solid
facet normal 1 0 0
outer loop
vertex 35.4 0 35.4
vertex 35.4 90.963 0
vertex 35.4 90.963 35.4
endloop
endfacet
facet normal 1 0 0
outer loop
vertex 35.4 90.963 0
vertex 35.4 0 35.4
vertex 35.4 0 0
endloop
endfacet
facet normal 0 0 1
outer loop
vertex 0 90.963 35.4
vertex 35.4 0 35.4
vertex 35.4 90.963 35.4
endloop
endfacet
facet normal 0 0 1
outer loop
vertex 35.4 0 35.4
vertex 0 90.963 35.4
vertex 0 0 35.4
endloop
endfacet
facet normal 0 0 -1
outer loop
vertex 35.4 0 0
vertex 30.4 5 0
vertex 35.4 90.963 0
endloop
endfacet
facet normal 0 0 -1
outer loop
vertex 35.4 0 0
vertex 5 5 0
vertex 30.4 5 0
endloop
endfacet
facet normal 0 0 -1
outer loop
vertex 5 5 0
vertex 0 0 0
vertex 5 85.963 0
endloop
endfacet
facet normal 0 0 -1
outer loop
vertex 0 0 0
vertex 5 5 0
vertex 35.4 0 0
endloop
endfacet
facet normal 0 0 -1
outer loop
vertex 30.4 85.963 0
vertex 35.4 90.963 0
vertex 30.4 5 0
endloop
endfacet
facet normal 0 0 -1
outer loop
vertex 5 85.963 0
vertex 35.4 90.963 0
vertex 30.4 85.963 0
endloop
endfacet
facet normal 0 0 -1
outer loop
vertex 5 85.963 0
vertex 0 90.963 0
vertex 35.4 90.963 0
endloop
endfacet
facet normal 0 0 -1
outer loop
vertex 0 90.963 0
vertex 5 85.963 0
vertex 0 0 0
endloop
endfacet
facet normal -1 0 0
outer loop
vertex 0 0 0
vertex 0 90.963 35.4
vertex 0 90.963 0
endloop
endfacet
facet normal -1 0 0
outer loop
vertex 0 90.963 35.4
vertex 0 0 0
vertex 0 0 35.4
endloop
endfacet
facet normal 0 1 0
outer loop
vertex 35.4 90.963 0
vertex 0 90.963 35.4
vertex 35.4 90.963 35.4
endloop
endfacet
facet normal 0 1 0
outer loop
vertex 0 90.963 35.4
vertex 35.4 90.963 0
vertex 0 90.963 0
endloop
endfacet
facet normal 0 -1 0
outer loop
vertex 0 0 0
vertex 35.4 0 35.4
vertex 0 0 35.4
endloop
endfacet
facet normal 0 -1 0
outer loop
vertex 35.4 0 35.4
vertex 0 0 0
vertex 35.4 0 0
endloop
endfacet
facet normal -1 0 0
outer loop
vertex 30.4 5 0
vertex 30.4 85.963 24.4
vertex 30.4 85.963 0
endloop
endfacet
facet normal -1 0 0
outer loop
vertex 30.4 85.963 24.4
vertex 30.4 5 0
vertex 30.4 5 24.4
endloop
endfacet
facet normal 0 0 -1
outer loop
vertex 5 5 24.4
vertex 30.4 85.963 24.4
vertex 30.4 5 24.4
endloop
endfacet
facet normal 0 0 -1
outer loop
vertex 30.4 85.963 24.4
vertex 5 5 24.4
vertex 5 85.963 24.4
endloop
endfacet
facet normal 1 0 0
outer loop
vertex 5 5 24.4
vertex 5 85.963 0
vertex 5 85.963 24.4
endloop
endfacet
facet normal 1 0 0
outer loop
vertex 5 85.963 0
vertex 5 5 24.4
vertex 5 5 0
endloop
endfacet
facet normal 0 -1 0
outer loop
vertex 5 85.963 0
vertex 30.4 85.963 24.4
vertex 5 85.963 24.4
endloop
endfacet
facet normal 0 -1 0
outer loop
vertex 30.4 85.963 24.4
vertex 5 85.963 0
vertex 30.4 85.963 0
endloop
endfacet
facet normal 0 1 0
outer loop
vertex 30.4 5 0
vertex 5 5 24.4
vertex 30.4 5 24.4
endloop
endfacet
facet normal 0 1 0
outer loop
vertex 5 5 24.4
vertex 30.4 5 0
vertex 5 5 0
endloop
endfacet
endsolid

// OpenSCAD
function fromInches(i) = i * 25.4;

clipWidth = fromInches(1);
clipLength = fromInches(3+3/16);
partHeight = fromInches(1);

difference () {
  cube([clipWidth+10, clipLength+10, partHeight+10]);
  translate ([5,5,-1])
      cube([clipWidth, clipLength, partHeight]);
}
